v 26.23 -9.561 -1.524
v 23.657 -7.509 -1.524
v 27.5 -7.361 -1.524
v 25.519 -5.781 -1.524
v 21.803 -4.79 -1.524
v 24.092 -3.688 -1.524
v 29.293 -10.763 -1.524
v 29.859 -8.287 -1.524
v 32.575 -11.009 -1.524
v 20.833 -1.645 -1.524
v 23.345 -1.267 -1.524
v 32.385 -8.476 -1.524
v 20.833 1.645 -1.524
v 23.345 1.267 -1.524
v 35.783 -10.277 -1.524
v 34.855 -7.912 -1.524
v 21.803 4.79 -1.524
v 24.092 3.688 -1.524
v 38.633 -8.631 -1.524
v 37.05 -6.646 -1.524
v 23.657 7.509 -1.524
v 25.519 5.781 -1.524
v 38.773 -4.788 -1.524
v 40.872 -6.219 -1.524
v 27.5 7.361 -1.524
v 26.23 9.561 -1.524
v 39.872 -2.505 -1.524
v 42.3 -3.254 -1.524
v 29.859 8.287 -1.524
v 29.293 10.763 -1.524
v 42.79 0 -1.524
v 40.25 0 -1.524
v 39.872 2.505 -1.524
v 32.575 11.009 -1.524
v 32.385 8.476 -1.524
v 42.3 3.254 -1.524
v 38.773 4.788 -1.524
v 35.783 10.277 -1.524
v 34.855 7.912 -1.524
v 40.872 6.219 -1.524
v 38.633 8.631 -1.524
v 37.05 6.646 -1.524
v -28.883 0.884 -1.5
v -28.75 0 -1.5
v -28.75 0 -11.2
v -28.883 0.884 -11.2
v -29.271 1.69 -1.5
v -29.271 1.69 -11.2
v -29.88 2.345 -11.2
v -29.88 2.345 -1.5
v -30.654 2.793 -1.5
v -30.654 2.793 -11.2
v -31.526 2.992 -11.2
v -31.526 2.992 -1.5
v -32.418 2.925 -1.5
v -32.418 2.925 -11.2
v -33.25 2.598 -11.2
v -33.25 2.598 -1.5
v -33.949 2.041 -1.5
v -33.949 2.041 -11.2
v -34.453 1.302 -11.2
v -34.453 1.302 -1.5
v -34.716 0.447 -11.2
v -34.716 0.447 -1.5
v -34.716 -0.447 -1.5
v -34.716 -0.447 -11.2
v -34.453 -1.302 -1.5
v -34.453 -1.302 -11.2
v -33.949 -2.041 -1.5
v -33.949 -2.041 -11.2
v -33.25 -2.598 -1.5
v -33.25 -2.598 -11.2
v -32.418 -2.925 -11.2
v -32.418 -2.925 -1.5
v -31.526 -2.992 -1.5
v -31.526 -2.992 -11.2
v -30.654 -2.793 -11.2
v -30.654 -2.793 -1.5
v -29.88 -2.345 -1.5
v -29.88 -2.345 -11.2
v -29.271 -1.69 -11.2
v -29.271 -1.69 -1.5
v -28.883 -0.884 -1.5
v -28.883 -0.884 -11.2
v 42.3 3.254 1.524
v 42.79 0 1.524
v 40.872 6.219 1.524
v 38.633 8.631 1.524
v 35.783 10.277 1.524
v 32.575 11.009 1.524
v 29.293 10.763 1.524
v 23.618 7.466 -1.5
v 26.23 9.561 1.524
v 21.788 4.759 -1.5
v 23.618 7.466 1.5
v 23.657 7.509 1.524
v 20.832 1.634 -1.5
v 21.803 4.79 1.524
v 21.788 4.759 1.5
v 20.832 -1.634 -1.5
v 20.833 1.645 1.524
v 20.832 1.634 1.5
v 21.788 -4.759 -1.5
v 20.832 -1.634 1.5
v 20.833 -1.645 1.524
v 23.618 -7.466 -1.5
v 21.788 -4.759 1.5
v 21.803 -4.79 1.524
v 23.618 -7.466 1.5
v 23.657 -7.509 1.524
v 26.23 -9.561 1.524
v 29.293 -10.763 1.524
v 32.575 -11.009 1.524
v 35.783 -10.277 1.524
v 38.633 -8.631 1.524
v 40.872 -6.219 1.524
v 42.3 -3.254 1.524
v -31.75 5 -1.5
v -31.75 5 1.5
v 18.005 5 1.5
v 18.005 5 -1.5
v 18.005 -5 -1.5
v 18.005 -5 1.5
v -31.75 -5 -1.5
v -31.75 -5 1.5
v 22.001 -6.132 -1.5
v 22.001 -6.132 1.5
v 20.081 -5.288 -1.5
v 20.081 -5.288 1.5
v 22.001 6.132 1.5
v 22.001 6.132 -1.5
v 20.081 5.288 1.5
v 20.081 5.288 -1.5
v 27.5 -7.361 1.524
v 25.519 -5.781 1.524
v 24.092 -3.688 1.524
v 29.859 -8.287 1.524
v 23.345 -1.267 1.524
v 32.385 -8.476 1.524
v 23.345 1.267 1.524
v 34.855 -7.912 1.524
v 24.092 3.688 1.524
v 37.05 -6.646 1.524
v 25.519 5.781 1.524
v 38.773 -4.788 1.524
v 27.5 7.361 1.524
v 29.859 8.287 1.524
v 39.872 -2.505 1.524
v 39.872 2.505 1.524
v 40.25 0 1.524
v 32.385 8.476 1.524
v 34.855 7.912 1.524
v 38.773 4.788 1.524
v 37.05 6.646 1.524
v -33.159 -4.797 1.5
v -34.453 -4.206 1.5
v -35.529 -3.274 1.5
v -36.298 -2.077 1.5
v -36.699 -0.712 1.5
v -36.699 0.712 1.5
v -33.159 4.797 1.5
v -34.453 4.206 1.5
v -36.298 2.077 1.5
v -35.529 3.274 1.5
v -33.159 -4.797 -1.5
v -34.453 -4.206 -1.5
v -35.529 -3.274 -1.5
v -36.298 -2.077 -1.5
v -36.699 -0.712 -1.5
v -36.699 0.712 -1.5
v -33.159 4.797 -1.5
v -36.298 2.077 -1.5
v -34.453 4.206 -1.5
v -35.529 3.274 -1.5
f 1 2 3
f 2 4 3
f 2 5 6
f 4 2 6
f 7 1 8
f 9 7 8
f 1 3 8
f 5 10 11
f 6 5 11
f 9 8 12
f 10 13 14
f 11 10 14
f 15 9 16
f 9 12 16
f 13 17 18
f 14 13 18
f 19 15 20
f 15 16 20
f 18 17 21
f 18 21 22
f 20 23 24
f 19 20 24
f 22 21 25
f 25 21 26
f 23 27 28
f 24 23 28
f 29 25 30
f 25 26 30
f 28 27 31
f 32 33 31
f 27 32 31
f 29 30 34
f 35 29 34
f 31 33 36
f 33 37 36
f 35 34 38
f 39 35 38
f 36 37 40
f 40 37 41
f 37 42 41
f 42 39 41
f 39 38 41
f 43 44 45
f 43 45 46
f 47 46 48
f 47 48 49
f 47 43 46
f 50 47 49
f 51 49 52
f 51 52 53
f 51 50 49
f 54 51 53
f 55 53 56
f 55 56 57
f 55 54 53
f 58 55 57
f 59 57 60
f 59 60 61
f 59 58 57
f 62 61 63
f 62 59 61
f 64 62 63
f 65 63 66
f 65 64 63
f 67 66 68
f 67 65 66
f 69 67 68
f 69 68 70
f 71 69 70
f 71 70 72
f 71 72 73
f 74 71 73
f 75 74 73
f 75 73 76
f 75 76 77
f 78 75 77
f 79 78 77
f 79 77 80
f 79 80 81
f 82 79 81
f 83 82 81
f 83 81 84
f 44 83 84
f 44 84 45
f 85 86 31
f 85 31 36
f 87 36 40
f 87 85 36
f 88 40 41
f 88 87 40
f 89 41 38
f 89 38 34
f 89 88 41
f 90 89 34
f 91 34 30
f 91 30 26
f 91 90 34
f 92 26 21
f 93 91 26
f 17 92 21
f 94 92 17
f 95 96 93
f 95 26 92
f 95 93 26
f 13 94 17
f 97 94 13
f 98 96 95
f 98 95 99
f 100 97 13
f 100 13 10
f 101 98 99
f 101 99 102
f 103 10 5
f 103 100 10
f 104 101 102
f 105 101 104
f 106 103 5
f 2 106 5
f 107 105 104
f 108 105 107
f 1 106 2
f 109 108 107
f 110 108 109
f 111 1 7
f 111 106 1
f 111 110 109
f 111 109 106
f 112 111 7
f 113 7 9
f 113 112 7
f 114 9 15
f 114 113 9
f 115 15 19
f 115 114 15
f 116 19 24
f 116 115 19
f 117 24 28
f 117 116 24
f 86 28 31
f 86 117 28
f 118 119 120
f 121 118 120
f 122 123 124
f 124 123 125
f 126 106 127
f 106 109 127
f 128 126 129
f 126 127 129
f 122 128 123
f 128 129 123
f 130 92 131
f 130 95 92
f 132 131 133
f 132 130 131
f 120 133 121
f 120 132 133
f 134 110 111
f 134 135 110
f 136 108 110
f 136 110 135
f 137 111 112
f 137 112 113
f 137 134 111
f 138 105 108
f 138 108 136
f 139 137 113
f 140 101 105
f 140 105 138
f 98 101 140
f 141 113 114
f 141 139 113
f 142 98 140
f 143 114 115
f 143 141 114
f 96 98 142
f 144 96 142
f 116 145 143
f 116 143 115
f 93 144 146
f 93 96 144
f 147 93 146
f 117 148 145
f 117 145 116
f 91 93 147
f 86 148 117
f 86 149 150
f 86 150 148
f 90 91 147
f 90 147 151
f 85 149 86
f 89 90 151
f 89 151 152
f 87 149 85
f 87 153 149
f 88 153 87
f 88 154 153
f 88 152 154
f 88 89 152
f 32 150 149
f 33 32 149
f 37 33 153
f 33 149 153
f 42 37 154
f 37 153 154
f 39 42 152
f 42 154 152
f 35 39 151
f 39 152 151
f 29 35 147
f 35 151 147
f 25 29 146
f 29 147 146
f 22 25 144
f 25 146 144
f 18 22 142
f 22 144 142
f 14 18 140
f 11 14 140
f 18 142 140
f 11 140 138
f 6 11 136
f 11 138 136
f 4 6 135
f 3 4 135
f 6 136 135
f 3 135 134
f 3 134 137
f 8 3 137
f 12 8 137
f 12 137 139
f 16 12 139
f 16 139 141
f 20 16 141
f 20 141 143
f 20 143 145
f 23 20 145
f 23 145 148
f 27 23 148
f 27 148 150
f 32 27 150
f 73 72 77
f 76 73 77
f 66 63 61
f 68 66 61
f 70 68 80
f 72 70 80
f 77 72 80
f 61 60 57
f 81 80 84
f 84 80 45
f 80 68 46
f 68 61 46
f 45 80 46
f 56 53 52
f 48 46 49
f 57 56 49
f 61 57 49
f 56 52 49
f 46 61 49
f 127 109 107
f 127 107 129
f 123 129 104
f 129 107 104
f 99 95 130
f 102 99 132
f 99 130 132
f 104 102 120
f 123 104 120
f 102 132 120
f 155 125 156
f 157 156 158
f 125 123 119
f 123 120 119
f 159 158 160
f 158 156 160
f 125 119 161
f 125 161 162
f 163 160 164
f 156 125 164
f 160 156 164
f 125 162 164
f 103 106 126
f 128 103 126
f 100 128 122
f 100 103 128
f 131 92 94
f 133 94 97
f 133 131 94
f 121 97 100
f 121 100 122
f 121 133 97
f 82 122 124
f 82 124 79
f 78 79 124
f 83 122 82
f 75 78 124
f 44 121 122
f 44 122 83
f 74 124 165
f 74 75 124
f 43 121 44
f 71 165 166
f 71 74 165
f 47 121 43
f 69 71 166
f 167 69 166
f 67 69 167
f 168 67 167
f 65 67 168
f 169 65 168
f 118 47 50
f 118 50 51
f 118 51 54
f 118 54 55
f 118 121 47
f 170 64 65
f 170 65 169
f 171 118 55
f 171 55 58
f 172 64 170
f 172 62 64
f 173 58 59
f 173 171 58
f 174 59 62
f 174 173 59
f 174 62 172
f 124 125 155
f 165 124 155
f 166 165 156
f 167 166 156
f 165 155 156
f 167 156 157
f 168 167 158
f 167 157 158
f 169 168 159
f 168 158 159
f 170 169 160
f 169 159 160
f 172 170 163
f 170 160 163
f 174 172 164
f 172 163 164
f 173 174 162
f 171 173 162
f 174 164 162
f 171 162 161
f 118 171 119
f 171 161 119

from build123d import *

# Parameters (mm, degrees)
SKETCH1_R           = 3
BOSS_EXTRUDE1_DEPTH = 1.5
SKETCH2_R           = 3
BOSS_EXTRUDE2_DEPTH = 12.7
SKETCH3_R           = 11.04
BOSS_EXTRUDE3_DEPTH = 1.524
FILLET1_R           = 7.62
SKETCH4_R           = 8.5
CUT_EXTRUDE1_DEPTH  = 13.724


with BuildPart() as part:
    # Sketch1 → Boss-Extrude1 (new body, symmetric)
    with BuildSketch(Plane.XY):
        with BuildLine():
            Line((-31.75, 5), (31.75, 5))
            ThreePointArc((31.75, 5), (36.75, 0), (31.75, -5))
            Line((31.75, -5), (-31.75, -5))
            ThreePointArc((-31.75, -5), (-36.75, 0), (-31.75, 5))
        make_face()
        with Locations((-31.75, 0)):
            Circle(SKETCH1_R, mode=Mode.SUBTRACT)
        with Locations((31.75, 0)):
            Circle(SKETCH1_R, mode=Mode.SUBTRACT)
    extrude(amount=BOSS_EXTRUDE1_DEPTH, both=True)

    # Sketch2 → Boss-Extrude2 (add)
    with BuildSketch(Plane.XY.offset(1.5)):
        with Locations((-31.75, 0)):
            Circle(SKETCH2_R)
    extrude(amount=-BOSS_EXTRUDE2_DEPTH)

    # Sketch3 → Boss-Extrude3 (add, symmetric)
    with BuildSketch(Plane.XY):
        with Locations((31.75, 0)):
            Circle(SKETCH3_R)
    extrude(amount=BOSS_EXTRUDE3_DEPTH, both=True)

    # Fillet1
    fillet1_edges = [part.edges().sort_by_distance(p)[0] for p in [
        (21.907154883, 5, 0),
        (21.907154883, -5, 0),
    ]]
    fillet(fillet1_edges, radius=FILLET1_R)

    # Sketch4 → Cut-Extrude1 (cut, through all)
    with BuildSketch(Plane.XY.offset(1.524)):
        with Locations((31.75, 0)):
            Circle(SKETCH4_R)
    extrude(amount=-CUT_EXTRUDE1_DEPTH, mode=Mode.SUBTRACT)


solid = part.part
